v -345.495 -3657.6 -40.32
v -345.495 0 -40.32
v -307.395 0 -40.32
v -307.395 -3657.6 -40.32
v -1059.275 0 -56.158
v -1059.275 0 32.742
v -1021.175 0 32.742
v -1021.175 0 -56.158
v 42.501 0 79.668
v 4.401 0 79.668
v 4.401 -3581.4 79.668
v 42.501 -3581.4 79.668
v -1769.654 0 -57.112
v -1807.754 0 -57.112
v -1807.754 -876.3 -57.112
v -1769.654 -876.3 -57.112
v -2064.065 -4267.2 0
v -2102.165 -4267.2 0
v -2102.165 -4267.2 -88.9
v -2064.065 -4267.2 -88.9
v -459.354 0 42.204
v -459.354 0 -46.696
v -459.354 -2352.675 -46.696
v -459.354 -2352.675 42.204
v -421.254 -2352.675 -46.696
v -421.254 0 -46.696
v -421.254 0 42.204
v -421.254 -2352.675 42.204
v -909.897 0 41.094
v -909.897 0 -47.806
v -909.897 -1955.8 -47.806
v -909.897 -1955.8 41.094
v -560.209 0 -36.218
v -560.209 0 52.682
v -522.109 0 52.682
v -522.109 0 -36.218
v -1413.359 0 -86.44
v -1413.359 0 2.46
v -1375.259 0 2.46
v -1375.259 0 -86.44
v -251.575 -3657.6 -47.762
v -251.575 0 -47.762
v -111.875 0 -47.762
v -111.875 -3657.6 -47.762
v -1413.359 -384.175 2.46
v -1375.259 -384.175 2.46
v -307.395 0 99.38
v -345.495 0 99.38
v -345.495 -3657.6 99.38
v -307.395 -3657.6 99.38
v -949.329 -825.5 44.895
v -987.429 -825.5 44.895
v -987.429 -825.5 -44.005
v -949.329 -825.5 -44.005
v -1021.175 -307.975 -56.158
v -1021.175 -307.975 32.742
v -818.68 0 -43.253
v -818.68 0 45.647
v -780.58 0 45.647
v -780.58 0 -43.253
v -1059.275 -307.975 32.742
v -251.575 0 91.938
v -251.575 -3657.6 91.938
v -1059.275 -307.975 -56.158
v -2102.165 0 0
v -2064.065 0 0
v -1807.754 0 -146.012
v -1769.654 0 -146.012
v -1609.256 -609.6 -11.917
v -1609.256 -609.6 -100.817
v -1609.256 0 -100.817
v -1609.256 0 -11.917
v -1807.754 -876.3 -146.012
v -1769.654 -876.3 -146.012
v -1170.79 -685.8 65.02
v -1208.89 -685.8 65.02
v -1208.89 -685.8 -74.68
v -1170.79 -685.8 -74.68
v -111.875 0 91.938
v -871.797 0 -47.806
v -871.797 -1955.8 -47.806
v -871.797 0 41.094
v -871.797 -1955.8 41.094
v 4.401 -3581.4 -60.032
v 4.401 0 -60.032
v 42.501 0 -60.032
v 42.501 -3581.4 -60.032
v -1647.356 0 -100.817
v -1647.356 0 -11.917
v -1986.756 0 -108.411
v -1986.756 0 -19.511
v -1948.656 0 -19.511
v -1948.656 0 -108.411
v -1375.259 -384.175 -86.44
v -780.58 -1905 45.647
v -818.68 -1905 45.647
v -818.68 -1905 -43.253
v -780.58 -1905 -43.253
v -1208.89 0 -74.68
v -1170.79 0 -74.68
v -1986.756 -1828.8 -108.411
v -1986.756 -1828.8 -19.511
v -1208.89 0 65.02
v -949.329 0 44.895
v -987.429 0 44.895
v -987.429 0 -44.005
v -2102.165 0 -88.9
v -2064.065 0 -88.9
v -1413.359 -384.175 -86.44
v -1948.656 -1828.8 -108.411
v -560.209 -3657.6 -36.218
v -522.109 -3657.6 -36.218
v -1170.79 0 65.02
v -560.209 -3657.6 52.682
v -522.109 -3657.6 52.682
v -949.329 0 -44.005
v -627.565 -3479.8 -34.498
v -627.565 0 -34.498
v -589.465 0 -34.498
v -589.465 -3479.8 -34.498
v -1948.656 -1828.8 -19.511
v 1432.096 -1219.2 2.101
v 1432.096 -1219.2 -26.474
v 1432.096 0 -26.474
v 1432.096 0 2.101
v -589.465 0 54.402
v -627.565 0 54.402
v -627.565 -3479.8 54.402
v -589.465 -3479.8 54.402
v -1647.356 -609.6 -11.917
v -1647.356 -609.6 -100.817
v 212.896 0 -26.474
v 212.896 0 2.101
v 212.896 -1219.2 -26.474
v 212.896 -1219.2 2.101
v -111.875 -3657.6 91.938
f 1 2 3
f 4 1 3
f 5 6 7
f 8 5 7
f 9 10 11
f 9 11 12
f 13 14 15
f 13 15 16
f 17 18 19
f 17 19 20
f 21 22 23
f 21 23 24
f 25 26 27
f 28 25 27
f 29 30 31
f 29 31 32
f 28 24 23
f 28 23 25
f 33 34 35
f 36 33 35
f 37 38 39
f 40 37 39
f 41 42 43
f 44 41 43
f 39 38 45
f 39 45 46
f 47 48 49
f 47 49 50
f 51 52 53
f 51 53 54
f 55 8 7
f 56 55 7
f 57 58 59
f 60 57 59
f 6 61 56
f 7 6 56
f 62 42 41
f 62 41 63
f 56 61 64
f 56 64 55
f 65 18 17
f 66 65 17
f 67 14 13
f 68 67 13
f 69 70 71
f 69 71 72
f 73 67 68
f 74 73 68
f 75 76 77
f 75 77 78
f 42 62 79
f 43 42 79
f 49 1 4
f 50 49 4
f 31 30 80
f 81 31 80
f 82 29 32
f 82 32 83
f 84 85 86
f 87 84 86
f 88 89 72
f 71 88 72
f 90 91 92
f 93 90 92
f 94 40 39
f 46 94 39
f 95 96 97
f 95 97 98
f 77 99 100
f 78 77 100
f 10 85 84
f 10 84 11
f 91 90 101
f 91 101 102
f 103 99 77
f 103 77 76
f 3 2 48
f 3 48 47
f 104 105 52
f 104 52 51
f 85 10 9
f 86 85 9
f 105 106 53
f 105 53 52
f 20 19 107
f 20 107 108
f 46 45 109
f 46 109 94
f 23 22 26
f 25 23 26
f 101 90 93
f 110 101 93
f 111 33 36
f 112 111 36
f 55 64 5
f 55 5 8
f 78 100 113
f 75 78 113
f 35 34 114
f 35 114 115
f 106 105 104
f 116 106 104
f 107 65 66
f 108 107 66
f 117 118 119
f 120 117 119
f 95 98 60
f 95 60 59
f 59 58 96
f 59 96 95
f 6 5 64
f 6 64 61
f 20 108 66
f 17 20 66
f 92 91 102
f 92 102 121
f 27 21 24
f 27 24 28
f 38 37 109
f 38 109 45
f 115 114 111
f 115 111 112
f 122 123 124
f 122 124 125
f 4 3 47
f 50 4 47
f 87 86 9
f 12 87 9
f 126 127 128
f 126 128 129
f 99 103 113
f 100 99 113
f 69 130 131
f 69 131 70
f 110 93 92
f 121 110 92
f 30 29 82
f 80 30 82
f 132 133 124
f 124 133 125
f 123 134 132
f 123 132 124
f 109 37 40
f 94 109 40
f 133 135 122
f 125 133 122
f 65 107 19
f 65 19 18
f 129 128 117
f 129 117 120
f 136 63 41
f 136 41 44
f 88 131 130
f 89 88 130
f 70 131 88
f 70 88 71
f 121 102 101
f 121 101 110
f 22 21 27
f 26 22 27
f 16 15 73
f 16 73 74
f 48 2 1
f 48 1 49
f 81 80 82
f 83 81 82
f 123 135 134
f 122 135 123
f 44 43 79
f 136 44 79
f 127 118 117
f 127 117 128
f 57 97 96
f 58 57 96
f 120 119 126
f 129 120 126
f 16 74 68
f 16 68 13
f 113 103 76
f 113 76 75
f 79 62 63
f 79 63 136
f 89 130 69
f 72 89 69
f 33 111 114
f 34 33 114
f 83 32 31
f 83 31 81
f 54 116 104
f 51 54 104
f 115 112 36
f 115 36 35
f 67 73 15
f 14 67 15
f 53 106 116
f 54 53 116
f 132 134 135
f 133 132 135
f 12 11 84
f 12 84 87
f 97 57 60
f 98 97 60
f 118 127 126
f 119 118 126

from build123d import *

# Parameters (mm, degrees)
F0_W      = 38.1
F0_H      = 139.7
F1_DEPTH  = 3657.6
F2_W      = 139.7
F2_H      = 139.7
F3_DEPTH  = 3657.6
F5_W      = 38.1
F5_H      = 139.7
F6_DEPTH  = 3581.4
F8_W      = 1219.2
F8_H      = 28.575
F9_DEPTH  = 1219.2
F10_W     = 38.1
F10_H     = 88.9
F11_DEPTH = 2352.675
F12_W     = 38.1
F12_H     = 88.9
F13_DEPTH = 3657.6
F15_W     = 38.1
F15_H     = 88.9
F16_DEPTH = 3479.8
F18_W     = 38.1
F18_H     = 88.9
F19_DEPTH = 1955.8
F20_W     = 38.1
F20_H     = 88.9
F21_DEPTH = 1905
F22_W     = 38.1
F22_H     = 88.9
F23_DEPTH = 825.5
F24_W     = 38.1
F24_H     = 88.9
F25_DEPTH = 307.975
F27_W     = 38.1
F27_H     = 139.7
F28_DEPTH = 685.8
F29_W     = 38.1
F29_H     = 88.9
F30_DEPTH = 384.175
F31_W     = 38.1
F31_H     = 88.9
F32_DEPTH = 609.6
F33_W     = 38.1
F33_H     = 88.9
F34_DEPTH = 876.3
F35_W     = 38.1
F35_H     = 88.9
F36_DEPTH = 1828.8
F37_W     = 38.1
F37_H     = 88.9
F38_DEPTH = 4267.2


with BuildPart() as f1:
    # F0 (on Front) → F1 (new body)
    with BuildSketch(Plane.XZ):
        with Locations((-326.445041, 29.529715)):
            Rectangle(F0_W, F0_H)
    extrude(amount=F1_DEPTH)


with BuildPart() as f3:
    # F2 (on Front) → F3 (new body)
    with BuildSketch(Plane.XZ):
        with Locations((-181.725139, 22.087785)):
            Rectangle(F2_W, F2_H)
    extrude(amount=F3_DEPTH)


with BuildPart() as f6:
    # F5 (on Front) → F6 (new body)
    with BuildSketch(Plane.XZ):
        with Locations((23.450868, 9.818288)):
            Rectangle(F5_W, F5_H)
    extrude(amount=F6_DEPTH)


with BuildPart() as f9:
    # F8 (on Front) → F9 (new body)
    with BuildSketch(Plane.XZ):
        with Locations((822.495766, -12.186169)):
            Rectangle(F8_W, F8_H)
    extrude(amount=F9_DEPTH)


with BuildPart() as f11:
    # F10 (on Front) → F11 (new body)
    with BuildSketch(Plane.XZ):
        with Locations((-440.30443, -2.246372)):
            Rectangle(F10_W, F10_H)
    extrude(amount=F11_DEPTH)


with BuildPart() as f13:
    # F12 (on Front) → F13 (new body)
    with BuildSketch(Plane.XZ):
        with Locations((-541.159334, 8.232057)):
            Rectangle(F12_W, F12_H)
    extrude(amount=F13_DEPTH)


with BuildPart() as f16:
    # F15 (on Front) → F16 (new body)
    with BuildSketch(Plane.XZ):
        with Locations((-608.514724, 9.951666)):
            Rectangle(F15_W, F15_H)
    extrude(amount=F16_DEPTH)


with BuildPart() as f19:
    # F18 (on Front) → F19 (new body)
    with BuildSketch(Plane.XZ):
        with Locations((-890.847085, -3.355786)):
            Rectangle(F18_W, F18_H)
    extrude(amount=F19_DEPTH)


with BuildPart() as f21:
    # F20 (on Front) → F21 (new body)
    with BuildSketch(Plane.XZ):
        with Locations((-799.629571, 1.197148)):
            Rectangle(F20_W, F20_H)
    extrude(amount=F21_DEPTH)


with BuildPart() as f23:
    # F22 (on Front) → F23 (new body)
    with BuildSketch(Plane.XZ):
        with Locations((-968.37938, 0.445198)):
            Rectangle(F22_W, F22_H)
    extrude(amount=F23_DEPTH)


with BuildPart() as f25:
    # F24 (on Front) → F25 (new body)
    with BuildSketch(Plane.XZ):
        with Locations((-1040.225385, -11.70845)):
            Rectangle(F24_W, F24_H)
    extrude(amount=F25_DEPTH)


with BuildPart() as f28:
    # F27 (on Front) → F28 (new body)
    with BuildSketch(Plane.XZ):
        with Locations((-1189.839961, -4.829874)):
            Rectangle(F27_W, F27_H)
    extrude(amount=F28_DEPTH)


with BuildPart() as f30:
    # F29 (on Front) → F30 (new body)
    with BuildSketch(Plane.XZ):
        with Locations((-1394.308923, -41.990325)):
            Rectangle(F29_W, F29_H)
    extrude(amount=F30_DEPTH)


with BuildPart() as f32:
    # F31 (on Front) → F32 (new body)
    with BuildSketch(Plane.XZ):
        with Locations((-1628.305914, -56.366913)):
            Rectangle(F31_W, F31_H)
    extrude(amount=F32_DEPTH)


with BuildPart() as f34:
    # F33 (on Front) → F34 (new body)
    with BuildSketch(Plane.XZ):
        with Locations((-1788.703801, -101.562202)):
            Rectangle(F33_W, F33_H)
    extrude(amount=F34_DEPTH)


with BuildPart() as f36:
    # F35 (on Front) → F36 (new body)
    with BuildSketch(Plane.XZ):
        with Locations((-1967.706086, -63.960642)):
            Rectangle(F35_W, F35_H)
    extrude(amount=F36_DEPTH)


with BuildPart() as f38:
    # F37 (on Front) → F38 (new body)
    with BuildSketch(Plane.XZ):
        with Locations((-2083.114984, -44.45)):
            Rectangle(F37_W, F37_H)
    extrude(amount=F38_DEPTH)


solid = Compound([f1.part, f3.part, f6.part, f9.part, f11.part, f13.part, f16.part, f19.part, f21.part, f23.part, f25.part, f28.part, f30.part, f32.part, f34.part, f36.part, f38.part])
